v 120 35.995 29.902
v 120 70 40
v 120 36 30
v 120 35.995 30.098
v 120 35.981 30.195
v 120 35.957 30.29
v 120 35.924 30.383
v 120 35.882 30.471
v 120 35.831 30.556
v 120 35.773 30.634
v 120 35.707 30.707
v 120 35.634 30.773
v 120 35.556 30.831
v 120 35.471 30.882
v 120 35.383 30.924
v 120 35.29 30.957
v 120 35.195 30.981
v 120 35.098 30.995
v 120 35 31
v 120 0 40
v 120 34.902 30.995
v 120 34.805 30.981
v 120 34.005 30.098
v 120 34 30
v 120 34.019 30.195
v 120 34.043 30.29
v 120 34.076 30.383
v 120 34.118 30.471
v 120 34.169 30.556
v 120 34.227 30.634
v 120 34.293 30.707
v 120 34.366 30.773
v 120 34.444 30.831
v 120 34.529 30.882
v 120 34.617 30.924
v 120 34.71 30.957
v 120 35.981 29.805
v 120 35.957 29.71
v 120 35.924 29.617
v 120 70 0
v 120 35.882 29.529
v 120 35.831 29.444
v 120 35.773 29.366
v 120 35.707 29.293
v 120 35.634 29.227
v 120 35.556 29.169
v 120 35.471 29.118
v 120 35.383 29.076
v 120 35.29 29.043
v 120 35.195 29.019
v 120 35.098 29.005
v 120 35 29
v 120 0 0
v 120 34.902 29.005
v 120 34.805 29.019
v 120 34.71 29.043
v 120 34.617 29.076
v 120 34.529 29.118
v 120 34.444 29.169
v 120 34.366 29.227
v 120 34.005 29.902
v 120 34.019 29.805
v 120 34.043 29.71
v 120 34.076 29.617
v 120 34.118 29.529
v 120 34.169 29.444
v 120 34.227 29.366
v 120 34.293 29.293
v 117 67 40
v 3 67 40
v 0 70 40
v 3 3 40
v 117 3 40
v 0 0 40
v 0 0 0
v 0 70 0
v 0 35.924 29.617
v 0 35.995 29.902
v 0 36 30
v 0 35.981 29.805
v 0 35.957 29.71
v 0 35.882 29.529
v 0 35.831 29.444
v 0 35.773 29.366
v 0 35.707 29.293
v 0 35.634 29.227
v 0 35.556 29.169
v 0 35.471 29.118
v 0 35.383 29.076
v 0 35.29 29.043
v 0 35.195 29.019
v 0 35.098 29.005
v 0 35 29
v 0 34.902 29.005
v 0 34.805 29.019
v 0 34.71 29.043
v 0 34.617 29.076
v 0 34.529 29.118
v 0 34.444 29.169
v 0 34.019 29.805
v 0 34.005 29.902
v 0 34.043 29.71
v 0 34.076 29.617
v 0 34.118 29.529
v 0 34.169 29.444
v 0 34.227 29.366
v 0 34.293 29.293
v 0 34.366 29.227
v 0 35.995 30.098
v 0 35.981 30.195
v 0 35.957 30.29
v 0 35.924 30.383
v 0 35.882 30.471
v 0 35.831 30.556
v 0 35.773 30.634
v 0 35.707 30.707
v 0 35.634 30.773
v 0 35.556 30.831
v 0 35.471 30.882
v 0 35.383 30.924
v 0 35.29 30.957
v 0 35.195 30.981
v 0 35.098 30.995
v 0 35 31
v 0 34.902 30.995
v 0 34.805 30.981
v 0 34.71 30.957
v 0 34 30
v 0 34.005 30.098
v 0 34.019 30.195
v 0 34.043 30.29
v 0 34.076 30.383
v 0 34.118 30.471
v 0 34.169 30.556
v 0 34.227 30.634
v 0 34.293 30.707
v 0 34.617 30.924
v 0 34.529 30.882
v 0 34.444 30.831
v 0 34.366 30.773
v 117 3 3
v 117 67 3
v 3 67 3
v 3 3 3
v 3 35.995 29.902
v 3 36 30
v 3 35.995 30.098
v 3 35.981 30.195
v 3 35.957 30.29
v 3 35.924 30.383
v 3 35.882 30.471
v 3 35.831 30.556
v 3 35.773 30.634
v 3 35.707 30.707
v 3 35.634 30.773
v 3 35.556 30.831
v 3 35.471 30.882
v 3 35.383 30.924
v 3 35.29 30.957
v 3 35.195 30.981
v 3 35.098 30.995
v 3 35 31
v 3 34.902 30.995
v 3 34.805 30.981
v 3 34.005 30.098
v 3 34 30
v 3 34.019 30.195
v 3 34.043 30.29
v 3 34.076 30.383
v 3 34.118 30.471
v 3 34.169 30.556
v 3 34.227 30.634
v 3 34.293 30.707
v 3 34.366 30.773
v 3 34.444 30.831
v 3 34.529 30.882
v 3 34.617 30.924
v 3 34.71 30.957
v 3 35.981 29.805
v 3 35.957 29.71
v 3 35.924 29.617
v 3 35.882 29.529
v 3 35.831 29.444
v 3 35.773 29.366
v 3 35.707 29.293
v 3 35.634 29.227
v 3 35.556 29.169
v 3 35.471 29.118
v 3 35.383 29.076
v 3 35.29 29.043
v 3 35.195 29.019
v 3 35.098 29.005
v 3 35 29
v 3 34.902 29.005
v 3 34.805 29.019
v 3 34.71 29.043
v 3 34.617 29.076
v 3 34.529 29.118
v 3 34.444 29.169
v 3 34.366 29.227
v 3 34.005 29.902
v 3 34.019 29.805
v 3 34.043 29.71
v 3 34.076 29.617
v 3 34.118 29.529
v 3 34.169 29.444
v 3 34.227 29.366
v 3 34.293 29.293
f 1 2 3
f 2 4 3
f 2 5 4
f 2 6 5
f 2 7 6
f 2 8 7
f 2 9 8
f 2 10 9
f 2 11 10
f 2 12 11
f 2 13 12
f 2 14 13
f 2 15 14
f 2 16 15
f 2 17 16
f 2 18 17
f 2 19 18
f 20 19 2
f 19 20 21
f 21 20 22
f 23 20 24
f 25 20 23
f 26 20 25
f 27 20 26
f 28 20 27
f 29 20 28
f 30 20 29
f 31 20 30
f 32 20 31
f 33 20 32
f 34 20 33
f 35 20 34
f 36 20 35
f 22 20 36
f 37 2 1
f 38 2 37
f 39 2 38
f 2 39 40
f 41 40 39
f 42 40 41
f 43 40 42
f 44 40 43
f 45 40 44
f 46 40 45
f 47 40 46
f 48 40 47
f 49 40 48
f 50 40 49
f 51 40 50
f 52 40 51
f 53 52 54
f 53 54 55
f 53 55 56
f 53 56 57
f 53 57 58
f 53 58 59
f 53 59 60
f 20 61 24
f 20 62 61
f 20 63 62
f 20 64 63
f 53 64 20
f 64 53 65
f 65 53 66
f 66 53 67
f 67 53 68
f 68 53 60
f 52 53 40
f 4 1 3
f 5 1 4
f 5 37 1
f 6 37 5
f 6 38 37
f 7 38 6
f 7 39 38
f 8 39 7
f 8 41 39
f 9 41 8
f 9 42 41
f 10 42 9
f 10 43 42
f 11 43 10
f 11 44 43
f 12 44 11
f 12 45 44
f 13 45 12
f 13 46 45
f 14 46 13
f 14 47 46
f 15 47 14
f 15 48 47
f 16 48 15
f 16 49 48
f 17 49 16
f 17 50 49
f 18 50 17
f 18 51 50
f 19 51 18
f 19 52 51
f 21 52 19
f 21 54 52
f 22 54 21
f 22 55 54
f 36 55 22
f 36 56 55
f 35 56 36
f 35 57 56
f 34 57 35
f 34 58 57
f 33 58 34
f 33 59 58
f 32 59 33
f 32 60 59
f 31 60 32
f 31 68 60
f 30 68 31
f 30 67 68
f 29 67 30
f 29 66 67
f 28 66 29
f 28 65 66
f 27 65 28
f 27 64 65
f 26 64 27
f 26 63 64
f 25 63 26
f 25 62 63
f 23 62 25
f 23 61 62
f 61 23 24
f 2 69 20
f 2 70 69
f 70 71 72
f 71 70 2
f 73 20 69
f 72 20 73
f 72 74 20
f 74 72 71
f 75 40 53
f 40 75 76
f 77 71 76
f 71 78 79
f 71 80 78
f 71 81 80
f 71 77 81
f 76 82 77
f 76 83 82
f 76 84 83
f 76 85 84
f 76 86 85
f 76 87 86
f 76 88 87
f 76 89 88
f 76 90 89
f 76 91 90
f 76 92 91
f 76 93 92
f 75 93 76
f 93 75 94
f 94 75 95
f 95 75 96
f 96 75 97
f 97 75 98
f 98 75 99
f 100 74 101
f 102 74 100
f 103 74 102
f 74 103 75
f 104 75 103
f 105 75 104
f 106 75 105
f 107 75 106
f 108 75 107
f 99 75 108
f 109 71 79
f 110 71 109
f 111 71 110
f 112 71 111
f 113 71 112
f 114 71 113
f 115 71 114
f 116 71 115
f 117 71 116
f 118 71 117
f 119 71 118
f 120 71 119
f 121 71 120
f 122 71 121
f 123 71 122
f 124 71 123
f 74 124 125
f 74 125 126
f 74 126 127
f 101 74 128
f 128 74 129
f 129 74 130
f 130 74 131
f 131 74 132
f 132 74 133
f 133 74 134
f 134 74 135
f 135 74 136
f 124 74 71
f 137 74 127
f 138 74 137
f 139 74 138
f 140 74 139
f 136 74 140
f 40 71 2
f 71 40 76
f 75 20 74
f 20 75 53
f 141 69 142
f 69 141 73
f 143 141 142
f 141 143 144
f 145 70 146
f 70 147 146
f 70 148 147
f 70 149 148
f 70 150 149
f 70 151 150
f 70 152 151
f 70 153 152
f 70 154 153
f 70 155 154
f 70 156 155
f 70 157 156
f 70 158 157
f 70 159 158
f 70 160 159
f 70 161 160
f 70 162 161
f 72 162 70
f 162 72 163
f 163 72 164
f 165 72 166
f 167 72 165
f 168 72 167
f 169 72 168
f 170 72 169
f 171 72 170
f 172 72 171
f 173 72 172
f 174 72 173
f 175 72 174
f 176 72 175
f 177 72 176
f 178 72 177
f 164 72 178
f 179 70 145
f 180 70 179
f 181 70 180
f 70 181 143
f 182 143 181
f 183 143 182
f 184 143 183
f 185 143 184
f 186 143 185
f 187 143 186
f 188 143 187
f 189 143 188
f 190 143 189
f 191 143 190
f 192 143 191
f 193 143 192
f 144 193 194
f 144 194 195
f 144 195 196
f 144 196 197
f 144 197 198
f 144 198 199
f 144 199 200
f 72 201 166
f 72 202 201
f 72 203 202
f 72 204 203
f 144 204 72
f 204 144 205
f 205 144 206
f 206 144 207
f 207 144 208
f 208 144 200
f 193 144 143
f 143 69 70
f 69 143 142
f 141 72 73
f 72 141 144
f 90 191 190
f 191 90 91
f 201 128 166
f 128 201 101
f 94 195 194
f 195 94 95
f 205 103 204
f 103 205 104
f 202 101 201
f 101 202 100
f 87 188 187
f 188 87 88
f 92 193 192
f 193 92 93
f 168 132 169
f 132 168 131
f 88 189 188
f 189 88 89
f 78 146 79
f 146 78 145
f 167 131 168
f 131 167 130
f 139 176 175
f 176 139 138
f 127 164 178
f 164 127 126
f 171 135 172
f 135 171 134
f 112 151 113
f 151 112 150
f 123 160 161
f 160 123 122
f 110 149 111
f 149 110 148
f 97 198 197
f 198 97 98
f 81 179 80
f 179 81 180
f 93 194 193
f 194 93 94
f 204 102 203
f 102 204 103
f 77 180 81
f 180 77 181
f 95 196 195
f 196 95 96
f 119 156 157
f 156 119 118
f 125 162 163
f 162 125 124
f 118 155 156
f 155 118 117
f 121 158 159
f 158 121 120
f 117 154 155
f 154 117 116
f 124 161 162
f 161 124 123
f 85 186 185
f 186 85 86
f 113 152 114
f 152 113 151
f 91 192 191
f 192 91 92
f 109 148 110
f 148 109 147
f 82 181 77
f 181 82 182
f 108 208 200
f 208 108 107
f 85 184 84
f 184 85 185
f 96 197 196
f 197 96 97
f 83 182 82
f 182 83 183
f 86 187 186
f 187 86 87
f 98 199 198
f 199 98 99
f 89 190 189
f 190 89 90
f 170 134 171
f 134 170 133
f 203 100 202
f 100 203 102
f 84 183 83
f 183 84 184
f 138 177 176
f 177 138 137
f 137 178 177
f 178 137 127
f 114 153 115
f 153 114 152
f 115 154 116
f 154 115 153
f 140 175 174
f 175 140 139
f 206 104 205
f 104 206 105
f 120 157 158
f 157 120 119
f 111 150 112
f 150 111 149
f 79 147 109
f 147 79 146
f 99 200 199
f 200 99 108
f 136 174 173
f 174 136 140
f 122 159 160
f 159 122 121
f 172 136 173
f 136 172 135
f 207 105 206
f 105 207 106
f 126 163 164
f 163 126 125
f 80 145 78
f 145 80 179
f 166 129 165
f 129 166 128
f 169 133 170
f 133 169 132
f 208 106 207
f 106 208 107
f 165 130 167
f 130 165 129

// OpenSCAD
// Buffer tank for mini horizontal gel-electrophoresis box
// Designed for FDM 3D printing

// --- Dimensions ---
outer_x = 120;      // Total length (X)
outer_y = 70;       // Total width (Y)
outer_z = 40;       // Total height (Z)
wall_t  = 3;        // Wall thickness
floor_t = 3;        // Floor thickness

platform_len = 60;  // Length of the central platform (X)
platform_h   = 13;  // Height of platform top from the inner floor (Z_inner + platform_h)
// Note: User specified platform top is 10mm above inner floor. 
// Inner floor is at z = 3. So platform top is at z = 3 + 10 = 13.

hole_d = 2;         // Diameter of electrode wire holes
hole_y = 0;         // Y-coordinate for holes (centered on Y axis)
hole_z = 30;        // Z-coordinate for holes

$fn = 64;

// --- Calculations ---
inner_x_start = wall_t;
inner_x_end   = outer_x - wall_t;
inner_y_start = wall_t;
inner_y_end   = outer_y - wall_t;
inner_z_start = floor_t;
inner_z_end   = outer_z;

// Platform placement
platform_x_start = (outer_x / 2) - (platform_len / 2);
platform_x_end   = (outer_x / 2) + (platform_len / 2);
platform_z_top   = floor_t + 10; // 10mm above inner floor

module tank_body() {
    difference() {
        // Main outer block
        cube([outer_x, outer_y, outer_z]);
        
        // Hollow out the interior
        translate([wall_t, wall_t, floor_t])
            cube([outer_x - 2*wall_t, outer_y - 2*wall_t, outer_z]);
    }
}

module platform() {
    // The platform spans the full inner width (Y)
    // It is 60mm long in X, centered.
    // It sits on the floor, but the user says "top is 10mm above inner floor"
    // So the height of the platform block is 10mm.
    translate([platform_x_start, wall_t, floor_t])
        cube([platform_len, outer_y - 2*wall_t, 10]);
}

module electrode_holes() {
    // Holes through the X-end walls at y=0 (relative to center) and z=30
    // Since the tank is centered on X and Y, y=0 is the center of the Y dimension.
    // The walls are at x=0 and x=outer_x.
    
    // Hole 1 (Left wall)
    translate([-1, outer_y/2, hole_z])
        rotate([0, 90, 0])
            cylinder(h = wall_t + 2, d = hole_d);
            
    // Hole 2 (Right wall)
    translate([outer_x, outer_y/2, hole_z])
        rotate([0, 90, 0])
            cylinder(h = wall_t + 2, d = hole_d);
}

// --- Final Assembly ---
// The tank rests on the XY plane at z=0
union() {
    difference() {
        tank_body();
        electrode_holes();
    }
    // We add the platform as a union because it is a "solid raised platform"
    // However, the tank_body is already a solid. 
    // To make the platform part of the solid, we use union.
    // But the platform is inside the hollow part. 
    // So we must subtract the hollow part from the union of (body + platform).
    // A cleaner way:
    // 1. Create the solid tank shell.
    // 2. Add the platform.
    // 3. Subtract the electrode holes.
}

// Corrected construction logic to ensure the platform is part of the solid:
// We will use a single difference() to avoid overlapping solids.

difference() {
    // The main solid block
    union() {
        // The outer shell
        cube([outer_x, outer_y, outer_z]);
        // The platform (added to the solid)
        translate([platform_x_start, wall_t, floor_t])
            cube([platform_len, outer_y - 2*wall_t, 10]);
    }
    
    // Subtract the hollow interior
    translate([wall_t, wall_t, floor_t])
        cube([outer_x - 2*wall_t, outer_y - 2*wall_t, outer_z]);
        
    // Subtract the electrode holes
    electrode_holes();
}
